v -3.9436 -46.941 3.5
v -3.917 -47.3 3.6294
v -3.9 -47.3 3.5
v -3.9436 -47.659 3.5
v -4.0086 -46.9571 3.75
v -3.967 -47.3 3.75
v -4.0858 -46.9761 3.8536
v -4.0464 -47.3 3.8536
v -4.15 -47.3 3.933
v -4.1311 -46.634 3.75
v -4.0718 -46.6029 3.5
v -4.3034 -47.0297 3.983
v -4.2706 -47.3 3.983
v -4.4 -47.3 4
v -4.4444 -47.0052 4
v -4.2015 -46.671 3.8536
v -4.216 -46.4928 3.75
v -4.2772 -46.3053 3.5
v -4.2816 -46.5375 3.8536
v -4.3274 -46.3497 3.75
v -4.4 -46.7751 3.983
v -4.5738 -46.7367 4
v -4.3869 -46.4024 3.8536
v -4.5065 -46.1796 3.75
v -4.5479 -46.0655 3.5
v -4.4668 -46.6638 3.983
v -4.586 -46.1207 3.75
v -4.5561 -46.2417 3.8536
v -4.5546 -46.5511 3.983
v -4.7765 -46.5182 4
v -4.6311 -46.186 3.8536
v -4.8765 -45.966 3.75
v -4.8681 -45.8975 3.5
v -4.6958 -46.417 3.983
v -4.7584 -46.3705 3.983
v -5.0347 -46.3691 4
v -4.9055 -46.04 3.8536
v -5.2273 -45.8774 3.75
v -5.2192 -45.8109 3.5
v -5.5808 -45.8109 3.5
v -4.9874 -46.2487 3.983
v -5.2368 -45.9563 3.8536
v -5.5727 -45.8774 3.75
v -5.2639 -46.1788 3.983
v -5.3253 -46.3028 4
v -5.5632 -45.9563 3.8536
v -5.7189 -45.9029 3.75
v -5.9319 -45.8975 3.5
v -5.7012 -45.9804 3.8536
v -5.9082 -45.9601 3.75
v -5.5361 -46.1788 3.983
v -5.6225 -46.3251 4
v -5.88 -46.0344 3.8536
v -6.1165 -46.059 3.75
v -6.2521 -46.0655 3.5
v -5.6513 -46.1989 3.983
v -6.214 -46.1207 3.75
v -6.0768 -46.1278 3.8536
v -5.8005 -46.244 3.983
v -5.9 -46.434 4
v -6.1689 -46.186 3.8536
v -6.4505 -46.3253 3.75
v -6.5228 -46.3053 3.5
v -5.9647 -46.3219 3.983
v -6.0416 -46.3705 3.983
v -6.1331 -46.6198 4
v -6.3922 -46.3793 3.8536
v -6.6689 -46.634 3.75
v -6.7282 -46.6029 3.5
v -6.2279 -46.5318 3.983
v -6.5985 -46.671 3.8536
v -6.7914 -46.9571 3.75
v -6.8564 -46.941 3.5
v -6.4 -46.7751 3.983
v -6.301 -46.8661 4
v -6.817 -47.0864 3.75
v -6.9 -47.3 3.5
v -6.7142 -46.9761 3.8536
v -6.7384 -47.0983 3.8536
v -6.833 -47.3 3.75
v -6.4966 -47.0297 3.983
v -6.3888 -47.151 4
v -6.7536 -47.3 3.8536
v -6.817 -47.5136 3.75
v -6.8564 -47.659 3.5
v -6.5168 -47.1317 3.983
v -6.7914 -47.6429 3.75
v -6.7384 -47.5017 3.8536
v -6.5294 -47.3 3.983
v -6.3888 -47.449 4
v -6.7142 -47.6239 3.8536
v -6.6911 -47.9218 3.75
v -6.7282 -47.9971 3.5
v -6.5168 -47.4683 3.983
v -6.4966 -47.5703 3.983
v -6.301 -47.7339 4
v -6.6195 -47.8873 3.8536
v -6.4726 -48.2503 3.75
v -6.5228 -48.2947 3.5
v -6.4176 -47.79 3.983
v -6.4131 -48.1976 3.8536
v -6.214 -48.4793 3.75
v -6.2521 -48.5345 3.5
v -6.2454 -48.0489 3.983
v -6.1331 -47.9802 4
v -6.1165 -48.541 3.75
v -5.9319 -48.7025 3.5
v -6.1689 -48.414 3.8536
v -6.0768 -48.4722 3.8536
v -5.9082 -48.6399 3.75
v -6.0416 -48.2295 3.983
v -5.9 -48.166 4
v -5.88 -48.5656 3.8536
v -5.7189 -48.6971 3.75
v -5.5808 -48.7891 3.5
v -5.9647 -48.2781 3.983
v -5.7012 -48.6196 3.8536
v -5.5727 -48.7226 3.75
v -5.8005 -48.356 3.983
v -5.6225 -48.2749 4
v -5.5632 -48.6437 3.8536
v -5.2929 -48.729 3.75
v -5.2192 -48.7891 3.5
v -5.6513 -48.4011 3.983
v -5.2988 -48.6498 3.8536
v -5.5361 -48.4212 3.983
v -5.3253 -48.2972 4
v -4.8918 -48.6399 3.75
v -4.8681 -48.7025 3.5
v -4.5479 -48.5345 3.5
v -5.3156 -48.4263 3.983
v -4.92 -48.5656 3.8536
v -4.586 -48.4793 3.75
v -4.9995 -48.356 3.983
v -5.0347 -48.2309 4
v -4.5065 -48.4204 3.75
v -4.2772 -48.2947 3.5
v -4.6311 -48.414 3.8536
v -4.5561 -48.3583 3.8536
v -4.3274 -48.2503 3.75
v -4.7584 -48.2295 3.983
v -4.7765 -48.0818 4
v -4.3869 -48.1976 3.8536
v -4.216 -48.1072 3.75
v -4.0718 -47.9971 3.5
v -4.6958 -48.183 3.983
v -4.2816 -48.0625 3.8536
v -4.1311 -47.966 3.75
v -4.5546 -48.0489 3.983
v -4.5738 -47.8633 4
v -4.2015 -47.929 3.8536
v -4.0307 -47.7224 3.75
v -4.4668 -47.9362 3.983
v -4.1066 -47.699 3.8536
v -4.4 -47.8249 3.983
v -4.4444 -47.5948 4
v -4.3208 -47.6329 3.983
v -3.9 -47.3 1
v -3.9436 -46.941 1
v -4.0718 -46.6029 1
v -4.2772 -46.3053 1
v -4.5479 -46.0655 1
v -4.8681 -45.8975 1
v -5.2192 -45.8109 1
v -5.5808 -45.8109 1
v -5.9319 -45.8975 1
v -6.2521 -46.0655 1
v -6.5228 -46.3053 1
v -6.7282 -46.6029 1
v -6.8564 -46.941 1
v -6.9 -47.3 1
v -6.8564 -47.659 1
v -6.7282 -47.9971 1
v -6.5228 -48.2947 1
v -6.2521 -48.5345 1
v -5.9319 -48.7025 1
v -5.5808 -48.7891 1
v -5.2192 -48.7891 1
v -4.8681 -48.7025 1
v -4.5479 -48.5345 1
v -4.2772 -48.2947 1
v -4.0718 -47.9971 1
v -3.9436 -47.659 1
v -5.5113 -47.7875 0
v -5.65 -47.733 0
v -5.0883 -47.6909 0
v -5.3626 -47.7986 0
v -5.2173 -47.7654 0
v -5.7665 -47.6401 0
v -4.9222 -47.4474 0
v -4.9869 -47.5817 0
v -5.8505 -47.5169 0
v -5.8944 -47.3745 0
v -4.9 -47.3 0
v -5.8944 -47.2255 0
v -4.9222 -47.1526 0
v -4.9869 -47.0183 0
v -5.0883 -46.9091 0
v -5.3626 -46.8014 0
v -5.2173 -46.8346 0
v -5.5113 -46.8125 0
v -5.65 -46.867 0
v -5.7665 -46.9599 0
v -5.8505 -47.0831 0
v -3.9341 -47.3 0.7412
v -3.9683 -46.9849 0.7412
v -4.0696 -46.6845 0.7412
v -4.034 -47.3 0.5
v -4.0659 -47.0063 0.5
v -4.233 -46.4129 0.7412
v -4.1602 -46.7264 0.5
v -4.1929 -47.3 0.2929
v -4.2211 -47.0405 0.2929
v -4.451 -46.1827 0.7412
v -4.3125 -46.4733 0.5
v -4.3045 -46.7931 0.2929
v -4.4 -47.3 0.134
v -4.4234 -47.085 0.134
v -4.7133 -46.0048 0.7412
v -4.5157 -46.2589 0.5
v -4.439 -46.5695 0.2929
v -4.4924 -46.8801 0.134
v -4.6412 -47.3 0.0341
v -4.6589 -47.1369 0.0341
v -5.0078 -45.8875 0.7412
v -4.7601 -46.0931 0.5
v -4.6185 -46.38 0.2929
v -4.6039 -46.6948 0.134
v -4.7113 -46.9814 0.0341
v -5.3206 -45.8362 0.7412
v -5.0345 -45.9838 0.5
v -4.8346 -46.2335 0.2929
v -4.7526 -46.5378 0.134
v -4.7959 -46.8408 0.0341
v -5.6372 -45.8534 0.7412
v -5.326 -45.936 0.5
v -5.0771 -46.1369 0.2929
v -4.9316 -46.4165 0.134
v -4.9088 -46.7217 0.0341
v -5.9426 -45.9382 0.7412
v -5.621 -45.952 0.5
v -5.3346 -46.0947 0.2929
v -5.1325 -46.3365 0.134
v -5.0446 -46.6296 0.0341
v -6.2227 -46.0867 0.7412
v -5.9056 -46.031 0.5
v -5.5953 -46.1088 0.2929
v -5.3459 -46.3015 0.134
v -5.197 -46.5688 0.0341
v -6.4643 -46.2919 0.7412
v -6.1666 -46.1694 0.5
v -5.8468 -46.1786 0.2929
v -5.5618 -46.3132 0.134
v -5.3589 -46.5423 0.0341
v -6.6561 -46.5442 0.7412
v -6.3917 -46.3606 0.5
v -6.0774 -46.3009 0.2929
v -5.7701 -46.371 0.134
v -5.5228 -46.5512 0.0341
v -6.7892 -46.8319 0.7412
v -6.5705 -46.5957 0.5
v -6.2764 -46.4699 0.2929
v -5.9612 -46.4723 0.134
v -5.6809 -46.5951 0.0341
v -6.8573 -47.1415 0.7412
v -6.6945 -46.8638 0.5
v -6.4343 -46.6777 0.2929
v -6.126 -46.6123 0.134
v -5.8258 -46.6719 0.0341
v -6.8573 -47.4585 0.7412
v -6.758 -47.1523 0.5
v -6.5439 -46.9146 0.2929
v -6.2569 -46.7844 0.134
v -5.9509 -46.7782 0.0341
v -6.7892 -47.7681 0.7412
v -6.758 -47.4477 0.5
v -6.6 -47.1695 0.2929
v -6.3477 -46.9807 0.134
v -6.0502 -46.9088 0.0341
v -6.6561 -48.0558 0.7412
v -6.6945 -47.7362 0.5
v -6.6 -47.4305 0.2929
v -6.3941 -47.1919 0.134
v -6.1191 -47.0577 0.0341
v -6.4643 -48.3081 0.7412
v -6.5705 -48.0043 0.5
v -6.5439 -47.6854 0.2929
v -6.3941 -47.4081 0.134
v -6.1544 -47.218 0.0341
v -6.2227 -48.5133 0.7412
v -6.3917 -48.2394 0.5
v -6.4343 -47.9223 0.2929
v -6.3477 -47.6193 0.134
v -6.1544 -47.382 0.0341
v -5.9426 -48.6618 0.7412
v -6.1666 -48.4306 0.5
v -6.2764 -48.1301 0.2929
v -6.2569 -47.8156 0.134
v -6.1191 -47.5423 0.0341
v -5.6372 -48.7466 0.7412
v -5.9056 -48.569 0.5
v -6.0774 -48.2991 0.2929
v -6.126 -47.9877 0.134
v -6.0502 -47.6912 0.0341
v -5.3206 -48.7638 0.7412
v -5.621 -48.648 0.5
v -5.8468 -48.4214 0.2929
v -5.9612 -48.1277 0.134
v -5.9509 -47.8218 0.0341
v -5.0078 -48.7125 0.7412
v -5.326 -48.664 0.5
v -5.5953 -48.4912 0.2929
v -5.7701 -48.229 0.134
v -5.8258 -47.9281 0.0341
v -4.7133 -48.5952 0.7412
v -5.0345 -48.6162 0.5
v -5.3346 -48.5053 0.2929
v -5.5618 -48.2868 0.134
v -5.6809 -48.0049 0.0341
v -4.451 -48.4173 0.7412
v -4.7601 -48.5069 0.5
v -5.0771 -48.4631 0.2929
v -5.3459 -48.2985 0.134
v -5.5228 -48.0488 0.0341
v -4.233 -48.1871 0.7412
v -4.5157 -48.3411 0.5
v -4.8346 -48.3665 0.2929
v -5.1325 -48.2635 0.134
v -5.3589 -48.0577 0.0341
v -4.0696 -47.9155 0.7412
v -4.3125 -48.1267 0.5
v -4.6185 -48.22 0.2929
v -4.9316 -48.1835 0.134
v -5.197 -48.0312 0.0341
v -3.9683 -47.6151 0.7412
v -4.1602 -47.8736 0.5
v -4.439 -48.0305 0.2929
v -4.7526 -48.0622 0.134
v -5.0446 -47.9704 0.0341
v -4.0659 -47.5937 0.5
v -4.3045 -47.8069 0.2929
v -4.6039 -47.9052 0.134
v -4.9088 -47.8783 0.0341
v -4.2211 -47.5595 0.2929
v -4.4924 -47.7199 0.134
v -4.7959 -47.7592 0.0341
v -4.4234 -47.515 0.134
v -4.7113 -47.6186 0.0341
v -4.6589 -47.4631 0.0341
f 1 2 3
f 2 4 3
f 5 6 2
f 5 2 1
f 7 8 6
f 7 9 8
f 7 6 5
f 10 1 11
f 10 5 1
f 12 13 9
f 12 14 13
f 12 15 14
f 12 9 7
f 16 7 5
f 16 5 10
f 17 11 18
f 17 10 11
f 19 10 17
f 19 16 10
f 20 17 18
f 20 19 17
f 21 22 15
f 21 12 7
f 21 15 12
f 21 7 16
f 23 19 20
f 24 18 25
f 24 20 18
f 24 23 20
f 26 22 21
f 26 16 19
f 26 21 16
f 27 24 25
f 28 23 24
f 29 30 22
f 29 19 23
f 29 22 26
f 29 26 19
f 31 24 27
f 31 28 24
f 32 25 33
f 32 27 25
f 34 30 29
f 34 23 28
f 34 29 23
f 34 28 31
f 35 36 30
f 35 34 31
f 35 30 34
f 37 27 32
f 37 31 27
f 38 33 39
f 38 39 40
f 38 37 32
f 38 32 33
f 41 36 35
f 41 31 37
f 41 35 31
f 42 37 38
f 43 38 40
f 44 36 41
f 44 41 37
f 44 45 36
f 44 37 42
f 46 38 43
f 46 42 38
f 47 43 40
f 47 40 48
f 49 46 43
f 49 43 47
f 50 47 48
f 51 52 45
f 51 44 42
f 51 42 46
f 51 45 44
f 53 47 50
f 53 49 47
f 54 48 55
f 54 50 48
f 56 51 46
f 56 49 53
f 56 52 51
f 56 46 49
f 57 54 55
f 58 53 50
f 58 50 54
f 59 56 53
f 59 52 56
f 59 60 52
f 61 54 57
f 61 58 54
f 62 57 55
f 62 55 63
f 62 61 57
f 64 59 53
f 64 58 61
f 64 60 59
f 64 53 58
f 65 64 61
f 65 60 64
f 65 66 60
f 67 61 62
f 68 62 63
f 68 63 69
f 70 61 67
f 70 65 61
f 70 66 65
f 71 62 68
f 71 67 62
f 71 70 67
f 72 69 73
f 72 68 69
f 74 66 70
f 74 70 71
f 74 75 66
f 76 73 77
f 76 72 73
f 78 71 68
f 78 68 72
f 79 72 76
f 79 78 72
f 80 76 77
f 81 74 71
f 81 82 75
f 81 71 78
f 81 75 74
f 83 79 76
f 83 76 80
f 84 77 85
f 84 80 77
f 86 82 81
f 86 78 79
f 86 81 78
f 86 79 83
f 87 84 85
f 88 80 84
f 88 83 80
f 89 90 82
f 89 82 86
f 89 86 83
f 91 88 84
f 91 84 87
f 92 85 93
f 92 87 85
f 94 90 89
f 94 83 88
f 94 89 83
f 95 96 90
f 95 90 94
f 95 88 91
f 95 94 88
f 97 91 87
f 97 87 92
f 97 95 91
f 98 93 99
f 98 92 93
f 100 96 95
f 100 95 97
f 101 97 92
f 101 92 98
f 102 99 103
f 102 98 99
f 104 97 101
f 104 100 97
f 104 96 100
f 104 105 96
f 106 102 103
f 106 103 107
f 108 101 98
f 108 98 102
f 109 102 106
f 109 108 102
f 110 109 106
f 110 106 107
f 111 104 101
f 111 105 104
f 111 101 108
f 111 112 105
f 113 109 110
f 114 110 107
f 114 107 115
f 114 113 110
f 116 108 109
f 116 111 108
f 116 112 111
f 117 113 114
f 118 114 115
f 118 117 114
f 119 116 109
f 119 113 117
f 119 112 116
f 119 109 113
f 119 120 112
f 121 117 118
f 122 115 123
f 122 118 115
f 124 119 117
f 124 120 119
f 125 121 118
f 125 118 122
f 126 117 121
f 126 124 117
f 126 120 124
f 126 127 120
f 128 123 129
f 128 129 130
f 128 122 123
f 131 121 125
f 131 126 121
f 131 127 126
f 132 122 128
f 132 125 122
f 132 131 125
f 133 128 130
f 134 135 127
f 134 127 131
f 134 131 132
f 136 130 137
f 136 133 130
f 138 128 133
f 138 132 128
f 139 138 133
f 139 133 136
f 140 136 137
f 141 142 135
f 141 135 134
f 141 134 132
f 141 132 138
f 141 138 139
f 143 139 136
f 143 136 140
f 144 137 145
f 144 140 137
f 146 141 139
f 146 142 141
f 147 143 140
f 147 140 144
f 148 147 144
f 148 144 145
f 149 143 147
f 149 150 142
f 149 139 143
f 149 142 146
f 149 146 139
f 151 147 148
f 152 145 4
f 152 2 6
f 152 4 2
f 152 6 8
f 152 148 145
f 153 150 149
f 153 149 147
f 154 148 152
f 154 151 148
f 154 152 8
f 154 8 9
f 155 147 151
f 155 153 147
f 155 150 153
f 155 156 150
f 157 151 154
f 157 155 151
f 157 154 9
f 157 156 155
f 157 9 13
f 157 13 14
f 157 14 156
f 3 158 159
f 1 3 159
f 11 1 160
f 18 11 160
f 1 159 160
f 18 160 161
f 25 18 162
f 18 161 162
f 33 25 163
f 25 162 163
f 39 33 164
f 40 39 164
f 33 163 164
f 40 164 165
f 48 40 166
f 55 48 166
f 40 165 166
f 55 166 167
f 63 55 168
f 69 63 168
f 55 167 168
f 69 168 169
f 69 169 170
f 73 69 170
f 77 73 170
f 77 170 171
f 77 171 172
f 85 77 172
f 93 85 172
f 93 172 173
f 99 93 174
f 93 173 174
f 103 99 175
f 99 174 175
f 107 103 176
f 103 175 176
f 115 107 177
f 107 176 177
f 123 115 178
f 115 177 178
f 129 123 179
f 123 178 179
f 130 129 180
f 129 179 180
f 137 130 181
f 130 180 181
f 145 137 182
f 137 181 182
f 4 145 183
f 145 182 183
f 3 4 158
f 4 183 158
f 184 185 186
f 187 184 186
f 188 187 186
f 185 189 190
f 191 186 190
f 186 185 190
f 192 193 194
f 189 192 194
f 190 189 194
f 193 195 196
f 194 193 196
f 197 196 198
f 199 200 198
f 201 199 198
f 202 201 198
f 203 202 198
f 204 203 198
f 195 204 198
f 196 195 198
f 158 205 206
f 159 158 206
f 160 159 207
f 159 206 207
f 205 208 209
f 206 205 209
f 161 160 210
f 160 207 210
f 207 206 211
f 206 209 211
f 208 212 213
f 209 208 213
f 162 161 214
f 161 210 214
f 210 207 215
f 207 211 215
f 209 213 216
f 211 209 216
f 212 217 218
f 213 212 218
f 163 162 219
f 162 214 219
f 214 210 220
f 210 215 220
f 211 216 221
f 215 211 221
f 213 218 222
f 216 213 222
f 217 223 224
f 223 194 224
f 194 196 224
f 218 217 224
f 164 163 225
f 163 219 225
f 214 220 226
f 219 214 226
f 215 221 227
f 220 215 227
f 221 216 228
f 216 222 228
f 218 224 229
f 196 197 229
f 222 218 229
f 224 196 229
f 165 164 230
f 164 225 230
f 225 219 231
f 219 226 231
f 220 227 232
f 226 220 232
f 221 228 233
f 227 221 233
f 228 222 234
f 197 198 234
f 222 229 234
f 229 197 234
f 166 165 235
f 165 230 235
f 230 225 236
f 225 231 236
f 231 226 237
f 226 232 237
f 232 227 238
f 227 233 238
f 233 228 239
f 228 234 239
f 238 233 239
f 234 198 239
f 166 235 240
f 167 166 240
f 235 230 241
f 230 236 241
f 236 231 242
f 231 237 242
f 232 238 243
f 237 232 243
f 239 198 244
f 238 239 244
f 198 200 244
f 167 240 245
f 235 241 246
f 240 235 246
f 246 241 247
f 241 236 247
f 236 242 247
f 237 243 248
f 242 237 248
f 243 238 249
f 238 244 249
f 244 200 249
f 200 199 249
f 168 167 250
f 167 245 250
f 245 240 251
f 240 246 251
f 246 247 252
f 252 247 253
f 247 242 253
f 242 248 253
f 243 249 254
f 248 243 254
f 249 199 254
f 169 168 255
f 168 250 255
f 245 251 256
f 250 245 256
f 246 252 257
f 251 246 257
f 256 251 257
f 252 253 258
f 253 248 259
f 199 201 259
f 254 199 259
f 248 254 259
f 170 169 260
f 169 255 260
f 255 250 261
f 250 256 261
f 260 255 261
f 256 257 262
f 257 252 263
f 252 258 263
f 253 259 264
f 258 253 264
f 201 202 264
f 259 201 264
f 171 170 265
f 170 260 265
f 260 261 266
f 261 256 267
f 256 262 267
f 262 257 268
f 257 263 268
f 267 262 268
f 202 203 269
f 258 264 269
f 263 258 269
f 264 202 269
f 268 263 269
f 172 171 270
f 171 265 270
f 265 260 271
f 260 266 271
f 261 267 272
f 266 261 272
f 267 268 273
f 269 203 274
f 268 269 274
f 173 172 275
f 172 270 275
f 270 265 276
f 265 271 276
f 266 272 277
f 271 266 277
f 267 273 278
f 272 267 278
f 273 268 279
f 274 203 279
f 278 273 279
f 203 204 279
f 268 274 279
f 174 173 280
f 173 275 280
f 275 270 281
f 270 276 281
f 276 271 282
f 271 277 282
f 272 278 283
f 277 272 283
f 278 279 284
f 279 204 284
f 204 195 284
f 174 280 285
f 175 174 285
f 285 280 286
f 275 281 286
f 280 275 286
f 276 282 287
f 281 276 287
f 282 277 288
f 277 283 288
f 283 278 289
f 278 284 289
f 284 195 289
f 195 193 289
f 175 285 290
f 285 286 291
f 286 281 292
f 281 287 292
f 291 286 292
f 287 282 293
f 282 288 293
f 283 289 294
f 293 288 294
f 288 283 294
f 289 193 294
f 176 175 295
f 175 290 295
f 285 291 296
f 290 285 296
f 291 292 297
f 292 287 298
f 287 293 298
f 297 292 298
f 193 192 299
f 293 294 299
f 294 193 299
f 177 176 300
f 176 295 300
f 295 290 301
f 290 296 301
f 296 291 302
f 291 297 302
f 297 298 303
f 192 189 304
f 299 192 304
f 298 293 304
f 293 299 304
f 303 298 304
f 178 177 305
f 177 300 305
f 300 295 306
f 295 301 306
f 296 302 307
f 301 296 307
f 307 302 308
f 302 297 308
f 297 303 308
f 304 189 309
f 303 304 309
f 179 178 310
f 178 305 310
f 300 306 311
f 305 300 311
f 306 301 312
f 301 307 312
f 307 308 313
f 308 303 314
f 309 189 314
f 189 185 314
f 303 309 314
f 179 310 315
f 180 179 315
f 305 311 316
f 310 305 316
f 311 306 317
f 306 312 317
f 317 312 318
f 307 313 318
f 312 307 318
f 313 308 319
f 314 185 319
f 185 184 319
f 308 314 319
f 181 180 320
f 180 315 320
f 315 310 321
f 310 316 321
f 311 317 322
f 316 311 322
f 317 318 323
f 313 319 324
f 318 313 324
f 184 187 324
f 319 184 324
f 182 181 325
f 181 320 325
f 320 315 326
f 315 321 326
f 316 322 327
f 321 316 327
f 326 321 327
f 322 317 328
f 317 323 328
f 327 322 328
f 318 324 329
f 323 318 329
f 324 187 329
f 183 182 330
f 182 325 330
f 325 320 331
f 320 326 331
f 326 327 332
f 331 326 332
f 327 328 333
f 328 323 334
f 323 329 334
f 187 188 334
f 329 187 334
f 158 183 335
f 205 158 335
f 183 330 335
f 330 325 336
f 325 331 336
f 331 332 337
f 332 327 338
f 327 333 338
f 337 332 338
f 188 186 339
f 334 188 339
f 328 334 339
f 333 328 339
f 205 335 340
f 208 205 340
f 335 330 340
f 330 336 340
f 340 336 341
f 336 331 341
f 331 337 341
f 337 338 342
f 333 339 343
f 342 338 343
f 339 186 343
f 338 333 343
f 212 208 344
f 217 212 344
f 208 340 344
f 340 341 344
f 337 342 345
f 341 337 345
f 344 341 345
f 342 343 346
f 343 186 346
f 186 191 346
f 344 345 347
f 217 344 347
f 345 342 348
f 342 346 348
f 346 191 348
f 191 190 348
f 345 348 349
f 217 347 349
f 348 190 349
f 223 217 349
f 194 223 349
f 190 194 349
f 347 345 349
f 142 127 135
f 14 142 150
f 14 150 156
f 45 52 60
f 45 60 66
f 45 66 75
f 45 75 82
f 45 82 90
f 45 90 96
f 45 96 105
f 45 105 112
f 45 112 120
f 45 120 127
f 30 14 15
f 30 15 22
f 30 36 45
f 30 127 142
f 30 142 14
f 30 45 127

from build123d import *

# Parameters (mm, degrees)
CYLINDER034_R     = 1.5
CYLINDER034_DEPTH = 4
FILLET019_1_R     = 1
FILLET019_2_R     = 0.5


with BuildPart() as part:
    # Cylinder034 → Cylinder034 (new body)
    with BuildSketch(Plane(origin=(-5.4, -47.3, 0), x_dir=(1, 0, 0), z_dir=(0, 0, 1))):
        Circle(CYLINDER034_R)
    extrude(amount=CYLINDER034_DEPTH)

    # Fillet019 1
    fillet019_1_edges = [part.edges().sort_by_distance(p)[0] for p in [
        (-6.9, -47.3, 0),
    ]]
    fillet(fillet019_1_edges, radius=FILLET019_1_R)

    # Fillet019 2
    fillet019_2_edges = [part.edges().sort_by_distance(p)[0] for p in [
        (-6.9, -47.3, 4),
    ]]
    fillet(fillet019_2_edges, radius=FILLET019_2_R)


solid = part.part
